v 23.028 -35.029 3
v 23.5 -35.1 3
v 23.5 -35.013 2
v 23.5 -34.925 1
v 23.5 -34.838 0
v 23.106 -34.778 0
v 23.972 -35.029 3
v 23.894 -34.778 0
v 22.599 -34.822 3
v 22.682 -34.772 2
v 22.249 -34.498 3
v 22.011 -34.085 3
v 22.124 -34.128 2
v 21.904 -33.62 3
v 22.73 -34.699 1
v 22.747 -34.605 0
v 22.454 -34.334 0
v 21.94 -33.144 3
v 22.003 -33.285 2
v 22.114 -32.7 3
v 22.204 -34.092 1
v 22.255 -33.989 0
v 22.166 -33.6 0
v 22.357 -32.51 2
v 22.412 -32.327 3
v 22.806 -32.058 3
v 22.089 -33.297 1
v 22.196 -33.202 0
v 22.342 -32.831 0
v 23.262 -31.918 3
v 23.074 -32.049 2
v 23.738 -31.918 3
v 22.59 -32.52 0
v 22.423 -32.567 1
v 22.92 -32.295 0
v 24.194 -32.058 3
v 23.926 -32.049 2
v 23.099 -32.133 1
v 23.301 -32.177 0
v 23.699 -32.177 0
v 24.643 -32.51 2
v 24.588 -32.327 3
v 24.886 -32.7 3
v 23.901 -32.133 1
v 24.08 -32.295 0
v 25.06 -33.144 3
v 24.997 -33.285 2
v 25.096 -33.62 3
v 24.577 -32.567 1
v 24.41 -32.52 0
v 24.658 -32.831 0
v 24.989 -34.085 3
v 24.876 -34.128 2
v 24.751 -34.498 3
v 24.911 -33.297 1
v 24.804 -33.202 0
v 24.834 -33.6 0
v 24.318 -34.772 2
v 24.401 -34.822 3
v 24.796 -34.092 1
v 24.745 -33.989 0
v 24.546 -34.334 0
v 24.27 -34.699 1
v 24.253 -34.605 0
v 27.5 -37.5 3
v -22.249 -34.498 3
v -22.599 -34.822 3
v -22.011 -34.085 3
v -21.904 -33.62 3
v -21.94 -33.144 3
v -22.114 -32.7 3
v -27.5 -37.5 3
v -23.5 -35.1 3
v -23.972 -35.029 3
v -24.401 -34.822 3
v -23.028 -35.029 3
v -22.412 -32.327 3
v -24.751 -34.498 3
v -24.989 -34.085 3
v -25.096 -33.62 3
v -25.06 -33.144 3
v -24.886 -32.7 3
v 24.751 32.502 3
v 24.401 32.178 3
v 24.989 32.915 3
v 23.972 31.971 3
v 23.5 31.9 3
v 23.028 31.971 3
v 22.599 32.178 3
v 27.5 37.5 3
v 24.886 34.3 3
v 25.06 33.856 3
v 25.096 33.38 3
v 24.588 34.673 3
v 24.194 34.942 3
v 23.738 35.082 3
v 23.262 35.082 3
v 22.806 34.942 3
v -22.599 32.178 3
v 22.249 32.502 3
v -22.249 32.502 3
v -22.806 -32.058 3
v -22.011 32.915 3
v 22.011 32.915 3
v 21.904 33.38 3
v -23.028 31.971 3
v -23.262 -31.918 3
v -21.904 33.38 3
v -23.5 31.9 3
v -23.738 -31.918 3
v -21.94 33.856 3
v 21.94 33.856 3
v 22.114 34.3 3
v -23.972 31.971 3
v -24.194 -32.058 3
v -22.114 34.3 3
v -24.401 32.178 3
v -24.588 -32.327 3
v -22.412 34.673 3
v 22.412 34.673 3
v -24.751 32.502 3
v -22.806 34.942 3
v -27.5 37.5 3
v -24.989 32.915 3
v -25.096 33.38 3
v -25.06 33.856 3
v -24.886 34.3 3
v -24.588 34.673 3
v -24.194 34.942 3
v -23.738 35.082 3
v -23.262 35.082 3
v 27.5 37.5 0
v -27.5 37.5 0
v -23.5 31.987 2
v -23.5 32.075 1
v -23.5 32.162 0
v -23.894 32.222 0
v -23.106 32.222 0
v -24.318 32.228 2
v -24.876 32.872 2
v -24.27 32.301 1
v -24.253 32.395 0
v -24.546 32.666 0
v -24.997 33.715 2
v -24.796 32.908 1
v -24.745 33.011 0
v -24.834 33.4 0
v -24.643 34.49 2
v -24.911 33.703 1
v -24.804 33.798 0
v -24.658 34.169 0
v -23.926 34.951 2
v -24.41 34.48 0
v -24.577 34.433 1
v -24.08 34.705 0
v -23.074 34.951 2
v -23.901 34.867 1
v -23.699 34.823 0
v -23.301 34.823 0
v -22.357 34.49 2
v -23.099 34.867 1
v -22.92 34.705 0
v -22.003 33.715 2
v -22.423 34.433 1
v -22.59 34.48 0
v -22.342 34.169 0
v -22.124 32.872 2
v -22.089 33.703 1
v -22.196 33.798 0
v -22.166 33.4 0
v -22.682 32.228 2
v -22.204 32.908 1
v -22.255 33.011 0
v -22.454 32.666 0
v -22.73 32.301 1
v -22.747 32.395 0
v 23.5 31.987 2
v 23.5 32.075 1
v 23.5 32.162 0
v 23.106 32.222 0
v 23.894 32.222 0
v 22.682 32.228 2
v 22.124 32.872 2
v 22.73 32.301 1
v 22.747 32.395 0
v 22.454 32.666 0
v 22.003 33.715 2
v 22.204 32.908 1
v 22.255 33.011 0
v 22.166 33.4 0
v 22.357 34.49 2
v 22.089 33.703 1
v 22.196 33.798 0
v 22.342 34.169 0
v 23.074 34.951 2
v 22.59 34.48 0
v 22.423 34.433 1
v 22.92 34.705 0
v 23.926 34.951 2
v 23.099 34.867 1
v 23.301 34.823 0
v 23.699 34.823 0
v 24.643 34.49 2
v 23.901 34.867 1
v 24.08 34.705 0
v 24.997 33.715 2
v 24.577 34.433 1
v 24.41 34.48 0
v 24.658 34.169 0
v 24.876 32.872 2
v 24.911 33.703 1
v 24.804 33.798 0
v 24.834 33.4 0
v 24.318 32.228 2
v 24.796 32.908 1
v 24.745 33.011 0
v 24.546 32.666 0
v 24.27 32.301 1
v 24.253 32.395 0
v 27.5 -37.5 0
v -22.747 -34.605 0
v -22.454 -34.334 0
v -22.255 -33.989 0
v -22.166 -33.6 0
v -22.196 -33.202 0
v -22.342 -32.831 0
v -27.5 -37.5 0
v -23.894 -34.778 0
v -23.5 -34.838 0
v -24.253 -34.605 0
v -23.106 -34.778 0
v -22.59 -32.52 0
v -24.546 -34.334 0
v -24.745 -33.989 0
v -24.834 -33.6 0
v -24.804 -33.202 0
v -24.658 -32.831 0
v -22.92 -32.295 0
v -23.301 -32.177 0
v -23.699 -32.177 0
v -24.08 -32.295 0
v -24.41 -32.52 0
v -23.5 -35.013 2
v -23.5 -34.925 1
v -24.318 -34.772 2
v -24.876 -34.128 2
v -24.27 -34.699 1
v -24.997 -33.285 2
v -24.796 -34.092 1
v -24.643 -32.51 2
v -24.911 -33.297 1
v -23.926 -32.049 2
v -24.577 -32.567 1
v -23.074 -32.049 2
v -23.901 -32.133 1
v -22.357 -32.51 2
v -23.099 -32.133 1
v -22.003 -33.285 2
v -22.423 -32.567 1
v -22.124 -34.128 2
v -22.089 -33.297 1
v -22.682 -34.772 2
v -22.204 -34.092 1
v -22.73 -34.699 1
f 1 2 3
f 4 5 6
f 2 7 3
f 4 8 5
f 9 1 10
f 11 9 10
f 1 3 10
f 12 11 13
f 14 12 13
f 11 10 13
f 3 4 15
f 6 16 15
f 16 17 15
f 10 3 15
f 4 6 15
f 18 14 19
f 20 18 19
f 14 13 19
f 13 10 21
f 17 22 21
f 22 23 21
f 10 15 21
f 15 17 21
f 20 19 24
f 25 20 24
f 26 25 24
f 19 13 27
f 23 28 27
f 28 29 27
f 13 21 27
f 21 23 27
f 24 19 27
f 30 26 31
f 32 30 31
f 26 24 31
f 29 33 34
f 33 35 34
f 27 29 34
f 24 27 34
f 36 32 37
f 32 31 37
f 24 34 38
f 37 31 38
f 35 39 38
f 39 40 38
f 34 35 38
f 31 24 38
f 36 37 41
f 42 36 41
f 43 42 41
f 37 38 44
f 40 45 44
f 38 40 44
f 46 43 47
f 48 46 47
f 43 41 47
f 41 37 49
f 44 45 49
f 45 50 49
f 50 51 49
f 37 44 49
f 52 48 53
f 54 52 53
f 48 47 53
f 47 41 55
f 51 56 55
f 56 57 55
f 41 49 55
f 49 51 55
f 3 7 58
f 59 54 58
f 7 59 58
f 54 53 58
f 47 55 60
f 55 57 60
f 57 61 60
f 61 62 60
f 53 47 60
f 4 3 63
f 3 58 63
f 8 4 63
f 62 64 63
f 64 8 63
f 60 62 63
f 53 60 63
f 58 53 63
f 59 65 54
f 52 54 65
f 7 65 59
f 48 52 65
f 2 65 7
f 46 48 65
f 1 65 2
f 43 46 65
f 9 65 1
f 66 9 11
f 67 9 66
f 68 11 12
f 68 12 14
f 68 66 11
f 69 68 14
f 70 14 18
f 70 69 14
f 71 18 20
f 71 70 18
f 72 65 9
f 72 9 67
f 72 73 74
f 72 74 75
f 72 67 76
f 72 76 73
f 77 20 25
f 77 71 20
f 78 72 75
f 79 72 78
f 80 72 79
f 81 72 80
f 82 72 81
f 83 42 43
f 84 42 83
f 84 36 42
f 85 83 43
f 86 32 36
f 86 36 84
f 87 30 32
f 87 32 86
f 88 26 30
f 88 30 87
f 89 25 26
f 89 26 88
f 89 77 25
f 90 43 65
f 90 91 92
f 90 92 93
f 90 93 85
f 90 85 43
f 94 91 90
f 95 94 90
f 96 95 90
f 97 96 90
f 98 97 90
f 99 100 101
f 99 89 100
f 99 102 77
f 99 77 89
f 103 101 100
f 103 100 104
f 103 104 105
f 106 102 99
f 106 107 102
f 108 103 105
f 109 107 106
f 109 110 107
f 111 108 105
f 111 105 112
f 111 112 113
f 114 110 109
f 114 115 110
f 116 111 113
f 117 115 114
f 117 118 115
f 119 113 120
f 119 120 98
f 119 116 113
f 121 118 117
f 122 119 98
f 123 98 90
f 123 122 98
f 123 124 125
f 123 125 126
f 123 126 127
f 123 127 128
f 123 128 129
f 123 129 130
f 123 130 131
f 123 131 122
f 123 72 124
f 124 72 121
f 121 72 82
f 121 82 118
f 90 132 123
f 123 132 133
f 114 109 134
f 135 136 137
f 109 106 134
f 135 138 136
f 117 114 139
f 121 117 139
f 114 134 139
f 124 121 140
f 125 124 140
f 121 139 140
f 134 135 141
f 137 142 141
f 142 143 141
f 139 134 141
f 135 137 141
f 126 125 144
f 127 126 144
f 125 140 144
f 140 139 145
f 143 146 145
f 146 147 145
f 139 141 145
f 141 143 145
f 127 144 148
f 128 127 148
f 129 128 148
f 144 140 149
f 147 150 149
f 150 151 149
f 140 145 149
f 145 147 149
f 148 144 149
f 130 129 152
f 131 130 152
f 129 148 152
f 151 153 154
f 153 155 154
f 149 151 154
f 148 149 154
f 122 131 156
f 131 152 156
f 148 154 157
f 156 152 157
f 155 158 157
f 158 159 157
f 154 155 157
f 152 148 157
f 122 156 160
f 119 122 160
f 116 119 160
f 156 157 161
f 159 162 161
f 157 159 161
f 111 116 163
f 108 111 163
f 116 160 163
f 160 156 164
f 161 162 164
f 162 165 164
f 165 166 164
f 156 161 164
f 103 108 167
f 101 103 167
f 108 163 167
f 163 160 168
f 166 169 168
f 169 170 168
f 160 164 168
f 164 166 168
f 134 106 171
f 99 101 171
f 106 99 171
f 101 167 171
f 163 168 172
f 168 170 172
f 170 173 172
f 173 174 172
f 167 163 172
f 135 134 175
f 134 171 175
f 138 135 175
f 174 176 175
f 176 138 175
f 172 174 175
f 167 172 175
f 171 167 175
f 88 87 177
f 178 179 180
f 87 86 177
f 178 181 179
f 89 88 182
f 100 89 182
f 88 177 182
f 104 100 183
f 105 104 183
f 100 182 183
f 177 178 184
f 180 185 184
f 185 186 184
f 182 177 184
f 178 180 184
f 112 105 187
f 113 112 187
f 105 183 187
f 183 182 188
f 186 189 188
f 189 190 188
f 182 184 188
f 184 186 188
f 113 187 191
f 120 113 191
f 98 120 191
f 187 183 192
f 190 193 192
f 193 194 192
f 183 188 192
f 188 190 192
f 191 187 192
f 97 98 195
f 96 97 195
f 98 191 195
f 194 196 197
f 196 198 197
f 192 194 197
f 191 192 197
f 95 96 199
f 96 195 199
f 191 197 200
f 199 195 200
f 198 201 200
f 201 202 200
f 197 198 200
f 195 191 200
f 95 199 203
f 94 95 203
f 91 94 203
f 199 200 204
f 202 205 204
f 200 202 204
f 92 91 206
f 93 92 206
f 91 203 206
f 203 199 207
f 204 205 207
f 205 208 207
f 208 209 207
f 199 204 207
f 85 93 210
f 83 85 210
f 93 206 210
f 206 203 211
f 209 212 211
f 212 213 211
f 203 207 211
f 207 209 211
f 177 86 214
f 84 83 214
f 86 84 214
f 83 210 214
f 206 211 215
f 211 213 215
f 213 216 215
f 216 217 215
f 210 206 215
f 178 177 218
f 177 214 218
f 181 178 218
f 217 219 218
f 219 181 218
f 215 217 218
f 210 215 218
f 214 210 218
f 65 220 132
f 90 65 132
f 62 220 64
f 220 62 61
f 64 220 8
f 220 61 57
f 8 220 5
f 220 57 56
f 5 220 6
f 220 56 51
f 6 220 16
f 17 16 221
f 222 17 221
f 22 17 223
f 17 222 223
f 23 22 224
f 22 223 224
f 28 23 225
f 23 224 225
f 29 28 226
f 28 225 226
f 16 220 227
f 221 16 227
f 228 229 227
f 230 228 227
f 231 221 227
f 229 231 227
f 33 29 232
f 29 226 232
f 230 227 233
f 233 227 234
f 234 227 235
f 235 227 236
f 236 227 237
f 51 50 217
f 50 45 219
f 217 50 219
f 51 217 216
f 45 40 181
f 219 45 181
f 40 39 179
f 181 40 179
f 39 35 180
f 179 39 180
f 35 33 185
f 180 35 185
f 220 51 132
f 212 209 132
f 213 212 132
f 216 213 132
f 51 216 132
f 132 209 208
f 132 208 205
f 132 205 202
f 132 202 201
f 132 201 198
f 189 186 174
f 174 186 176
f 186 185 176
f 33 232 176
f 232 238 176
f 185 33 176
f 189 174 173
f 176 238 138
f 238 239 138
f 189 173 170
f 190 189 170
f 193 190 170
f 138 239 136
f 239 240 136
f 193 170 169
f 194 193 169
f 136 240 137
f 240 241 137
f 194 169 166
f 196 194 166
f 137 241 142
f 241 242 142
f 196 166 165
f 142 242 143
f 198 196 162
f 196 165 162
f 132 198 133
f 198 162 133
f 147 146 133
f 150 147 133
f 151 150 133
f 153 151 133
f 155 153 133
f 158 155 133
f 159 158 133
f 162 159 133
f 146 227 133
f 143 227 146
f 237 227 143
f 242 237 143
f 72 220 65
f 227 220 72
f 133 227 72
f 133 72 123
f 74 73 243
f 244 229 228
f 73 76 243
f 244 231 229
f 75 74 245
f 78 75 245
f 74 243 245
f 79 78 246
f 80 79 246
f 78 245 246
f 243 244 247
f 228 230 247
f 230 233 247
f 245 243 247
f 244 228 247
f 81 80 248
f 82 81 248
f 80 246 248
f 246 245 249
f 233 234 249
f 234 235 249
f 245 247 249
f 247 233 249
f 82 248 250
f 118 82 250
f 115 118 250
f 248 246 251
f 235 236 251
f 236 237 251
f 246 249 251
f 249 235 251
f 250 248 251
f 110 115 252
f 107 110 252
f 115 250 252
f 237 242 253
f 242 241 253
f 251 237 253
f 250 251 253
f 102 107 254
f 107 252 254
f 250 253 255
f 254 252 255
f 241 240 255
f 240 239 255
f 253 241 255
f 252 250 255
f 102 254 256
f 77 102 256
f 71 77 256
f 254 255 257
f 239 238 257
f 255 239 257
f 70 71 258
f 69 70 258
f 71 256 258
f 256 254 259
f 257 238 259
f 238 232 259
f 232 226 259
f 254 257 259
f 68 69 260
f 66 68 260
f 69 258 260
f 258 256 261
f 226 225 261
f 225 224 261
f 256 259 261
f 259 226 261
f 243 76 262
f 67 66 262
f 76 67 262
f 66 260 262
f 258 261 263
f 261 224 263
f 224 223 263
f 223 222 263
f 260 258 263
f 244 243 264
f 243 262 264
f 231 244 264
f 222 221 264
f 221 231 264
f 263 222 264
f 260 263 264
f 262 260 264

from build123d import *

# Parameters (mm, degrees)
SKETCH1_W           = 75
SKETCH1_H           = 55
BOSS_EXTRUDE1_DEPTH = 3


with BuildPart() as part:
    # Sketch1 → Boss-Extrude1 (new body)
    with BuildSketch(Plane(origin=(0, 0, 0), x_dir=(0, 1, 0), z_dir=(0, 0, 1))):
        Rectangle(SKETCH1_W, SKETCH1_H)
    extrude(amount=BOSS_EXTRUDE1_DEPTH)

    # Cut-Extrude1 cone 1 section (through the dimple's axis) → Cut-Extrude1 (revolve, cut)
    with BuildSketch(Plane(origin=(-23.5, 33.5, 3), x_dir=(0, -1, 0), z_dir=(1, 0, 0))):
        Polygon((0, 0), (1.6, 0), (0, 18.288083684), align=None)
    revolve(axis=Axis((-23.5, 33.5, 3), (0, 0, -1)), mode=Mode.SUBTRACT)

    # Cut-Extrude1 cone 2 section (through the dimple's axis) → Cut-Extrude1 cone 2 (revolve, cut)
    with BuildSketch(Plane(origin=(23.5, 33.5, 3), x_dir=(0, -1, 0), z_dir=(1, 0, 0))):
        Polygon((0, 0), (1.6, 0), (0, 18.288083684), align=None)
    revolve(axis=Axis((23.5, 33.5, 3), (0, 0, -1)), mode=Mode.SUBTRACT)

    # Cut-Extrude1 cone 3 section (through the dimple's axis) → Cut-Extrude1 cone 3 (revolve, cut)
    with BuildSketch(Plane(origin=(-23.5, -33.5, 3), x_dir=(0, -1, 0), z_dir=(1, 0, 0))):
        Polygon((0, 0), (1.6, 0), (0, 18.288083684), align=None)
    revolve(axis=Axis((-23.5, -33.5, 3), (0, 0, -1)), mode=Mode.SUBTRACT)

    # Cut-Extrude1 cone 4 section (through the dimple's axis) → Cut-Extrude1 cone 4 (revolve, cut)
    with BuildSketch(Plane(origin=(23.5, -33.5, 3), x_dir=(0, -1, 0), z_dir=(1, 0, 0))):
        Polygon((0, 0), (1.6, 0), (0, 18.288083684), align=None)
    revolve(axis=Axis((23.5, -33.5, 3), (0, 0, -1)), mode=Mode.SUBTRACT)


solid = part.part
